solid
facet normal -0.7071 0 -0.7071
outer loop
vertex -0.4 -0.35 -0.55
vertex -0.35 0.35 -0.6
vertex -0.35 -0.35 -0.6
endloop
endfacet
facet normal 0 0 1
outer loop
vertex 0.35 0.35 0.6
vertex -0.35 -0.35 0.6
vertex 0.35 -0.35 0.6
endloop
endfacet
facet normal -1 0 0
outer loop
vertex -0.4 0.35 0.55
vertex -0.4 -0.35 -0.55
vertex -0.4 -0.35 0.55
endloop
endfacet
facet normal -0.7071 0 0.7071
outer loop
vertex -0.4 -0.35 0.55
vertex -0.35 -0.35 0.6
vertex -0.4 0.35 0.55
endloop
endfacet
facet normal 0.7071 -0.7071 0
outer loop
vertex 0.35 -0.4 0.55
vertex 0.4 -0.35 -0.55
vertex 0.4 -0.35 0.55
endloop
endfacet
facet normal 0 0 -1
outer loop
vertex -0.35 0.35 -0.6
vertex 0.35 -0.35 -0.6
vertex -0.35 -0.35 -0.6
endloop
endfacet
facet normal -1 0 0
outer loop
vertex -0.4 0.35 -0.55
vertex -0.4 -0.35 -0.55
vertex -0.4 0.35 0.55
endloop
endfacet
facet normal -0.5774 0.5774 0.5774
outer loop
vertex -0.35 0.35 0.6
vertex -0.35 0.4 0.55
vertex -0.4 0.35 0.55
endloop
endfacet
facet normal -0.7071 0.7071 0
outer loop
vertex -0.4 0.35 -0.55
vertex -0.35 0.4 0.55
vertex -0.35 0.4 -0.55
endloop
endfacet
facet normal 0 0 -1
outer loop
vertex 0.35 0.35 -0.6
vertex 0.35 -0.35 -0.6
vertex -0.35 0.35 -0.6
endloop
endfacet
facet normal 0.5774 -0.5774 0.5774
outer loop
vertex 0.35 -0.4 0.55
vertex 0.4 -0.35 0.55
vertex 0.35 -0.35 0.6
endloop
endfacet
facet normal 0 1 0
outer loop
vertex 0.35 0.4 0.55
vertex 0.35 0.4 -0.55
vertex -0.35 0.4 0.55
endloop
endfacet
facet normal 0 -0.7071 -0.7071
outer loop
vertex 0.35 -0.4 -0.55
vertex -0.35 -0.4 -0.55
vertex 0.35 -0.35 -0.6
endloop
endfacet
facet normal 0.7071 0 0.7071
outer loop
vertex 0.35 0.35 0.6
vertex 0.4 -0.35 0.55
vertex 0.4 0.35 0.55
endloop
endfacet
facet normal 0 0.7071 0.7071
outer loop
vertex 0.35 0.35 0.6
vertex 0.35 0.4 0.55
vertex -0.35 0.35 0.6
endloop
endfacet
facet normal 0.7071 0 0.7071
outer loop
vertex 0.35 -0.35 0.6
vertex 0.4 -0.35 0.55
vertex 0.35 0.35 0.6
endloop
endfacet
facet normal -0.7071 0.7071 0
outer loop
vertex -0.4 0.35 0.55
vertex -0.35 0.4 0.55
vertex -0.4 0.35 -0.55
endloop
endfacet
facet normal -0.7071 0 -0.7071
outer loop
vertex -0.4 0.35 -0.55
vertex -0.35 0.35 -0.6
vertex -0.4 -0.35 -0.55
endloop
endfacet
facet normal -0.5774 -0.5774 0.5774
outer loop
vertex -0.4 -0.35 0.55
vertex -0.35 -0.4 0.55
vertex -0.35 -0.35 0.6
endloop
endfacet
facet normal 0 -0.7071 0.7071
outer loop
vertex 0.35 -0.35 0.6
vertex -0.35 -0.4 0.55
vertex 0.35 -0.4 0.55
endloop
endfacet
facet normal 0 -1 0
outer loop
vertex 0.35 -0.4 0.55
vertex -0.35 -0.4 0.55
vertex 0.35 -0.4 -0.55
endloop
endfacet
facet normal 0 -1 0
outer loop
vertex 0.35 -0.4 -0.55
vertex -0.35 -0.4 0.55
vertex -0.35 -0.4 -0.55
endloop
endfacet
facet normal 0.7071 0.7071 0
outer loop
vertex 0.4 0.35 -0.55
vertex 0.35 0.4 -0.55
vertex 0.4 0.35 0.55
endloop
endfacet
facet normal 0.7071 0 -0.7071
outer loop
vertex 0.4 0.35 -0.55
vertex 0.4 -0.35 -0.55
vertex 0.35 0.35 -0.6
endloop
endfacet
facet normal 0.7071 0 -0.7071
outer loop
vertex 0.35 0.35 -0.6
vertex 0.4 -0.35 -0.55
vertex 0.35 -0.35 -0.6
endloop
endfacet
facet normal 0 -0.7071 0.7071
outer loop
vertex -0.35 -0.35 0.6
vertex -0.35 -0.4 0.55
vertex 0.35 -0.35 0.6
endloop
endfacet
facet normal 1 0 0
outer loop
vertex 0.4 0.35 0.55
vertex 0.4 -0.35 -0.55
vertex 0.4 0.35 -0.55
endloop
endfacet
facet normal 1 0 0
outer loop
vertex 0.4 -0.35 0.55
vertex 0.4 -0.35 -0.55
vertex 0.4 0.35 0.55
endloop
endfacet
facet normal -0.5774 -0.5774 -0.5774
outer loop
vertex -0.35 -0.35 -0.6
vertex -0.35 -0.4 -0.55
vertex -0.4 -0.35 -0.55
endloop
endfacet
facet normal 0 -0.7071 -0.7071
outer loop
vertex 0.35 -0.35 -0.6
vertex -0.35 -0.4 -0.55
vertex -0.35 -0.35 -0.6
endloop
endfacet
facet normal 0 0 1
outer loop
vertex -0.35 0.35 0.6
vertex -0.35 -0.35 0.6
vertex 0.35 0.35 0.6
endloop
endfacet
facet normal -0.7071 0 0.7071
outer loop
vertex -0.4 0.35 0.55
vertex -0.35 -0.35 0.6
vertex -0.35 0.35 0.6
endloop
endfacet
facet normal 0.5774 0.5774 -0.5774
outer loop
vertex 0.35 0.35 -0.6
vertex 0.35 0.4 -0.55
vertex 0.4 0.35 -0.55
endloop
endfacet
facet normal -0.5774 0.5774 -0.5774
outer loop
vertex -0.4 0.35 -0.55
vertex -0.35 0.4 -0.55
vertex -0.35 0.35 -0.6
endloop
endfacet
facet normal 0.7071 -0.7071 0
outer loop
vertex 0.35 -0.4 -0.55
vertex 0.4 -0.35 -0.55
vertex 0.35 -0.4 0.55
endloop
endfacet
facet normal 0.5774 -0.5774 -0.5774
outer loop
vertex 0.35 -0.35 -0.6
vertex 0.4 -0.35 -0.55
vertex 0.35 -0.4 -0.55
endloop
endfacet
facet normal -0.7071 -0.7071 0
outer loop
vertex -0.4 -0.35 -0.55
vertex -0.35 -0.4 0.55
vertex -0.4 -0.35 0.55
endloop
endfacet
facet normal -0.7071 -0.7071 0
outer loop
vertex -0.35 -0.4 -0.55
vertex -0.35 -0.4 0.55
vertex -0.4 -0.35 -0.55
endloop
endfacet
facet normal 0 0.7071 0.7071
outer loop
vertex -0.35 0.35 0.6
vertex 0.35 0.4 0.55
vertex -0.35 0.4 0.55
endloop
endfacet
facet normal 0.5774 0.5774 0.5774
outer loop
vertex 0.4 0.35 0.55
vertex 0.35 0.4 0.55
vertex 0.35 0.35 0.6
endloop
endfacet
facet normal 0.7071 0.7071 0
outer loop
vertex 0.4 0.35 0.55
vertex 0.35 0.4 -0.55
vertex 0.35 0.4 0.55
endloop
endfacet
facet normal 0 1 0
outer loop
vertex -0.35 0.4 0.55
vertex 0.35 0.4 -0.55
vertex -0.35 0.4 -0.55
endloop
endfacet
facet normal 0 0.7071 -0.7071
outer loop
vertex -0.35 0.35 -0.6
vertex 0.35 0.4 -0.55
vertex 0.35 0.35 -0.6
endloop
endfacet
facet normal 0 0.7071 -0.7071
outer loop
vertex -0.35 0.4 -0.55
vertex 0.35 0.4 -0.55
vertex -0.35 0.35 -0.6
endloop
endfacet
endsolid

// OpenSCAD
// Simple chamfered spacer block (mm)
L = 0.8;      // X
W = 0.8;      // Y
H = 1.2;      // Z
chamfer = 0.05; // planar bevel amount
$fn = 48;

module chamfered_block(L, W, H, c) {
    eps = 1e-6;
    c2 = min(c, L/2 - eps, W/2 - eps, H/2 - eps);

    // If chamfer is effectively zero, fall back to a plain cube
    if (c2 <= 0)
        cube([L, W, H], center=true);
    else
        minkowski() {
            cube([L - 2*c2, W - 2*c2, H - 2*c2], center=true);

            // Octahedron kernel -> flat chamfers (not rounded)
            polyhedron(
                points=[
                    [ c2, 0, 0], [-c2, 0, 0],
                    [ 0, c2, 0], [ 0,-c2, 0],
                    [ 0, 0, c2], [ 0, 0,-c2]
                ],
                faces=[
                    [0,2,4],[2,1,4],[1,3,4],[3,0,4],
                    [2,0,5],[1,2,5],[3,1,5],[0,3,5]
                ],
                convexity=10
            );
        }
}

chamfered_block(L, W, H, chamfer);
